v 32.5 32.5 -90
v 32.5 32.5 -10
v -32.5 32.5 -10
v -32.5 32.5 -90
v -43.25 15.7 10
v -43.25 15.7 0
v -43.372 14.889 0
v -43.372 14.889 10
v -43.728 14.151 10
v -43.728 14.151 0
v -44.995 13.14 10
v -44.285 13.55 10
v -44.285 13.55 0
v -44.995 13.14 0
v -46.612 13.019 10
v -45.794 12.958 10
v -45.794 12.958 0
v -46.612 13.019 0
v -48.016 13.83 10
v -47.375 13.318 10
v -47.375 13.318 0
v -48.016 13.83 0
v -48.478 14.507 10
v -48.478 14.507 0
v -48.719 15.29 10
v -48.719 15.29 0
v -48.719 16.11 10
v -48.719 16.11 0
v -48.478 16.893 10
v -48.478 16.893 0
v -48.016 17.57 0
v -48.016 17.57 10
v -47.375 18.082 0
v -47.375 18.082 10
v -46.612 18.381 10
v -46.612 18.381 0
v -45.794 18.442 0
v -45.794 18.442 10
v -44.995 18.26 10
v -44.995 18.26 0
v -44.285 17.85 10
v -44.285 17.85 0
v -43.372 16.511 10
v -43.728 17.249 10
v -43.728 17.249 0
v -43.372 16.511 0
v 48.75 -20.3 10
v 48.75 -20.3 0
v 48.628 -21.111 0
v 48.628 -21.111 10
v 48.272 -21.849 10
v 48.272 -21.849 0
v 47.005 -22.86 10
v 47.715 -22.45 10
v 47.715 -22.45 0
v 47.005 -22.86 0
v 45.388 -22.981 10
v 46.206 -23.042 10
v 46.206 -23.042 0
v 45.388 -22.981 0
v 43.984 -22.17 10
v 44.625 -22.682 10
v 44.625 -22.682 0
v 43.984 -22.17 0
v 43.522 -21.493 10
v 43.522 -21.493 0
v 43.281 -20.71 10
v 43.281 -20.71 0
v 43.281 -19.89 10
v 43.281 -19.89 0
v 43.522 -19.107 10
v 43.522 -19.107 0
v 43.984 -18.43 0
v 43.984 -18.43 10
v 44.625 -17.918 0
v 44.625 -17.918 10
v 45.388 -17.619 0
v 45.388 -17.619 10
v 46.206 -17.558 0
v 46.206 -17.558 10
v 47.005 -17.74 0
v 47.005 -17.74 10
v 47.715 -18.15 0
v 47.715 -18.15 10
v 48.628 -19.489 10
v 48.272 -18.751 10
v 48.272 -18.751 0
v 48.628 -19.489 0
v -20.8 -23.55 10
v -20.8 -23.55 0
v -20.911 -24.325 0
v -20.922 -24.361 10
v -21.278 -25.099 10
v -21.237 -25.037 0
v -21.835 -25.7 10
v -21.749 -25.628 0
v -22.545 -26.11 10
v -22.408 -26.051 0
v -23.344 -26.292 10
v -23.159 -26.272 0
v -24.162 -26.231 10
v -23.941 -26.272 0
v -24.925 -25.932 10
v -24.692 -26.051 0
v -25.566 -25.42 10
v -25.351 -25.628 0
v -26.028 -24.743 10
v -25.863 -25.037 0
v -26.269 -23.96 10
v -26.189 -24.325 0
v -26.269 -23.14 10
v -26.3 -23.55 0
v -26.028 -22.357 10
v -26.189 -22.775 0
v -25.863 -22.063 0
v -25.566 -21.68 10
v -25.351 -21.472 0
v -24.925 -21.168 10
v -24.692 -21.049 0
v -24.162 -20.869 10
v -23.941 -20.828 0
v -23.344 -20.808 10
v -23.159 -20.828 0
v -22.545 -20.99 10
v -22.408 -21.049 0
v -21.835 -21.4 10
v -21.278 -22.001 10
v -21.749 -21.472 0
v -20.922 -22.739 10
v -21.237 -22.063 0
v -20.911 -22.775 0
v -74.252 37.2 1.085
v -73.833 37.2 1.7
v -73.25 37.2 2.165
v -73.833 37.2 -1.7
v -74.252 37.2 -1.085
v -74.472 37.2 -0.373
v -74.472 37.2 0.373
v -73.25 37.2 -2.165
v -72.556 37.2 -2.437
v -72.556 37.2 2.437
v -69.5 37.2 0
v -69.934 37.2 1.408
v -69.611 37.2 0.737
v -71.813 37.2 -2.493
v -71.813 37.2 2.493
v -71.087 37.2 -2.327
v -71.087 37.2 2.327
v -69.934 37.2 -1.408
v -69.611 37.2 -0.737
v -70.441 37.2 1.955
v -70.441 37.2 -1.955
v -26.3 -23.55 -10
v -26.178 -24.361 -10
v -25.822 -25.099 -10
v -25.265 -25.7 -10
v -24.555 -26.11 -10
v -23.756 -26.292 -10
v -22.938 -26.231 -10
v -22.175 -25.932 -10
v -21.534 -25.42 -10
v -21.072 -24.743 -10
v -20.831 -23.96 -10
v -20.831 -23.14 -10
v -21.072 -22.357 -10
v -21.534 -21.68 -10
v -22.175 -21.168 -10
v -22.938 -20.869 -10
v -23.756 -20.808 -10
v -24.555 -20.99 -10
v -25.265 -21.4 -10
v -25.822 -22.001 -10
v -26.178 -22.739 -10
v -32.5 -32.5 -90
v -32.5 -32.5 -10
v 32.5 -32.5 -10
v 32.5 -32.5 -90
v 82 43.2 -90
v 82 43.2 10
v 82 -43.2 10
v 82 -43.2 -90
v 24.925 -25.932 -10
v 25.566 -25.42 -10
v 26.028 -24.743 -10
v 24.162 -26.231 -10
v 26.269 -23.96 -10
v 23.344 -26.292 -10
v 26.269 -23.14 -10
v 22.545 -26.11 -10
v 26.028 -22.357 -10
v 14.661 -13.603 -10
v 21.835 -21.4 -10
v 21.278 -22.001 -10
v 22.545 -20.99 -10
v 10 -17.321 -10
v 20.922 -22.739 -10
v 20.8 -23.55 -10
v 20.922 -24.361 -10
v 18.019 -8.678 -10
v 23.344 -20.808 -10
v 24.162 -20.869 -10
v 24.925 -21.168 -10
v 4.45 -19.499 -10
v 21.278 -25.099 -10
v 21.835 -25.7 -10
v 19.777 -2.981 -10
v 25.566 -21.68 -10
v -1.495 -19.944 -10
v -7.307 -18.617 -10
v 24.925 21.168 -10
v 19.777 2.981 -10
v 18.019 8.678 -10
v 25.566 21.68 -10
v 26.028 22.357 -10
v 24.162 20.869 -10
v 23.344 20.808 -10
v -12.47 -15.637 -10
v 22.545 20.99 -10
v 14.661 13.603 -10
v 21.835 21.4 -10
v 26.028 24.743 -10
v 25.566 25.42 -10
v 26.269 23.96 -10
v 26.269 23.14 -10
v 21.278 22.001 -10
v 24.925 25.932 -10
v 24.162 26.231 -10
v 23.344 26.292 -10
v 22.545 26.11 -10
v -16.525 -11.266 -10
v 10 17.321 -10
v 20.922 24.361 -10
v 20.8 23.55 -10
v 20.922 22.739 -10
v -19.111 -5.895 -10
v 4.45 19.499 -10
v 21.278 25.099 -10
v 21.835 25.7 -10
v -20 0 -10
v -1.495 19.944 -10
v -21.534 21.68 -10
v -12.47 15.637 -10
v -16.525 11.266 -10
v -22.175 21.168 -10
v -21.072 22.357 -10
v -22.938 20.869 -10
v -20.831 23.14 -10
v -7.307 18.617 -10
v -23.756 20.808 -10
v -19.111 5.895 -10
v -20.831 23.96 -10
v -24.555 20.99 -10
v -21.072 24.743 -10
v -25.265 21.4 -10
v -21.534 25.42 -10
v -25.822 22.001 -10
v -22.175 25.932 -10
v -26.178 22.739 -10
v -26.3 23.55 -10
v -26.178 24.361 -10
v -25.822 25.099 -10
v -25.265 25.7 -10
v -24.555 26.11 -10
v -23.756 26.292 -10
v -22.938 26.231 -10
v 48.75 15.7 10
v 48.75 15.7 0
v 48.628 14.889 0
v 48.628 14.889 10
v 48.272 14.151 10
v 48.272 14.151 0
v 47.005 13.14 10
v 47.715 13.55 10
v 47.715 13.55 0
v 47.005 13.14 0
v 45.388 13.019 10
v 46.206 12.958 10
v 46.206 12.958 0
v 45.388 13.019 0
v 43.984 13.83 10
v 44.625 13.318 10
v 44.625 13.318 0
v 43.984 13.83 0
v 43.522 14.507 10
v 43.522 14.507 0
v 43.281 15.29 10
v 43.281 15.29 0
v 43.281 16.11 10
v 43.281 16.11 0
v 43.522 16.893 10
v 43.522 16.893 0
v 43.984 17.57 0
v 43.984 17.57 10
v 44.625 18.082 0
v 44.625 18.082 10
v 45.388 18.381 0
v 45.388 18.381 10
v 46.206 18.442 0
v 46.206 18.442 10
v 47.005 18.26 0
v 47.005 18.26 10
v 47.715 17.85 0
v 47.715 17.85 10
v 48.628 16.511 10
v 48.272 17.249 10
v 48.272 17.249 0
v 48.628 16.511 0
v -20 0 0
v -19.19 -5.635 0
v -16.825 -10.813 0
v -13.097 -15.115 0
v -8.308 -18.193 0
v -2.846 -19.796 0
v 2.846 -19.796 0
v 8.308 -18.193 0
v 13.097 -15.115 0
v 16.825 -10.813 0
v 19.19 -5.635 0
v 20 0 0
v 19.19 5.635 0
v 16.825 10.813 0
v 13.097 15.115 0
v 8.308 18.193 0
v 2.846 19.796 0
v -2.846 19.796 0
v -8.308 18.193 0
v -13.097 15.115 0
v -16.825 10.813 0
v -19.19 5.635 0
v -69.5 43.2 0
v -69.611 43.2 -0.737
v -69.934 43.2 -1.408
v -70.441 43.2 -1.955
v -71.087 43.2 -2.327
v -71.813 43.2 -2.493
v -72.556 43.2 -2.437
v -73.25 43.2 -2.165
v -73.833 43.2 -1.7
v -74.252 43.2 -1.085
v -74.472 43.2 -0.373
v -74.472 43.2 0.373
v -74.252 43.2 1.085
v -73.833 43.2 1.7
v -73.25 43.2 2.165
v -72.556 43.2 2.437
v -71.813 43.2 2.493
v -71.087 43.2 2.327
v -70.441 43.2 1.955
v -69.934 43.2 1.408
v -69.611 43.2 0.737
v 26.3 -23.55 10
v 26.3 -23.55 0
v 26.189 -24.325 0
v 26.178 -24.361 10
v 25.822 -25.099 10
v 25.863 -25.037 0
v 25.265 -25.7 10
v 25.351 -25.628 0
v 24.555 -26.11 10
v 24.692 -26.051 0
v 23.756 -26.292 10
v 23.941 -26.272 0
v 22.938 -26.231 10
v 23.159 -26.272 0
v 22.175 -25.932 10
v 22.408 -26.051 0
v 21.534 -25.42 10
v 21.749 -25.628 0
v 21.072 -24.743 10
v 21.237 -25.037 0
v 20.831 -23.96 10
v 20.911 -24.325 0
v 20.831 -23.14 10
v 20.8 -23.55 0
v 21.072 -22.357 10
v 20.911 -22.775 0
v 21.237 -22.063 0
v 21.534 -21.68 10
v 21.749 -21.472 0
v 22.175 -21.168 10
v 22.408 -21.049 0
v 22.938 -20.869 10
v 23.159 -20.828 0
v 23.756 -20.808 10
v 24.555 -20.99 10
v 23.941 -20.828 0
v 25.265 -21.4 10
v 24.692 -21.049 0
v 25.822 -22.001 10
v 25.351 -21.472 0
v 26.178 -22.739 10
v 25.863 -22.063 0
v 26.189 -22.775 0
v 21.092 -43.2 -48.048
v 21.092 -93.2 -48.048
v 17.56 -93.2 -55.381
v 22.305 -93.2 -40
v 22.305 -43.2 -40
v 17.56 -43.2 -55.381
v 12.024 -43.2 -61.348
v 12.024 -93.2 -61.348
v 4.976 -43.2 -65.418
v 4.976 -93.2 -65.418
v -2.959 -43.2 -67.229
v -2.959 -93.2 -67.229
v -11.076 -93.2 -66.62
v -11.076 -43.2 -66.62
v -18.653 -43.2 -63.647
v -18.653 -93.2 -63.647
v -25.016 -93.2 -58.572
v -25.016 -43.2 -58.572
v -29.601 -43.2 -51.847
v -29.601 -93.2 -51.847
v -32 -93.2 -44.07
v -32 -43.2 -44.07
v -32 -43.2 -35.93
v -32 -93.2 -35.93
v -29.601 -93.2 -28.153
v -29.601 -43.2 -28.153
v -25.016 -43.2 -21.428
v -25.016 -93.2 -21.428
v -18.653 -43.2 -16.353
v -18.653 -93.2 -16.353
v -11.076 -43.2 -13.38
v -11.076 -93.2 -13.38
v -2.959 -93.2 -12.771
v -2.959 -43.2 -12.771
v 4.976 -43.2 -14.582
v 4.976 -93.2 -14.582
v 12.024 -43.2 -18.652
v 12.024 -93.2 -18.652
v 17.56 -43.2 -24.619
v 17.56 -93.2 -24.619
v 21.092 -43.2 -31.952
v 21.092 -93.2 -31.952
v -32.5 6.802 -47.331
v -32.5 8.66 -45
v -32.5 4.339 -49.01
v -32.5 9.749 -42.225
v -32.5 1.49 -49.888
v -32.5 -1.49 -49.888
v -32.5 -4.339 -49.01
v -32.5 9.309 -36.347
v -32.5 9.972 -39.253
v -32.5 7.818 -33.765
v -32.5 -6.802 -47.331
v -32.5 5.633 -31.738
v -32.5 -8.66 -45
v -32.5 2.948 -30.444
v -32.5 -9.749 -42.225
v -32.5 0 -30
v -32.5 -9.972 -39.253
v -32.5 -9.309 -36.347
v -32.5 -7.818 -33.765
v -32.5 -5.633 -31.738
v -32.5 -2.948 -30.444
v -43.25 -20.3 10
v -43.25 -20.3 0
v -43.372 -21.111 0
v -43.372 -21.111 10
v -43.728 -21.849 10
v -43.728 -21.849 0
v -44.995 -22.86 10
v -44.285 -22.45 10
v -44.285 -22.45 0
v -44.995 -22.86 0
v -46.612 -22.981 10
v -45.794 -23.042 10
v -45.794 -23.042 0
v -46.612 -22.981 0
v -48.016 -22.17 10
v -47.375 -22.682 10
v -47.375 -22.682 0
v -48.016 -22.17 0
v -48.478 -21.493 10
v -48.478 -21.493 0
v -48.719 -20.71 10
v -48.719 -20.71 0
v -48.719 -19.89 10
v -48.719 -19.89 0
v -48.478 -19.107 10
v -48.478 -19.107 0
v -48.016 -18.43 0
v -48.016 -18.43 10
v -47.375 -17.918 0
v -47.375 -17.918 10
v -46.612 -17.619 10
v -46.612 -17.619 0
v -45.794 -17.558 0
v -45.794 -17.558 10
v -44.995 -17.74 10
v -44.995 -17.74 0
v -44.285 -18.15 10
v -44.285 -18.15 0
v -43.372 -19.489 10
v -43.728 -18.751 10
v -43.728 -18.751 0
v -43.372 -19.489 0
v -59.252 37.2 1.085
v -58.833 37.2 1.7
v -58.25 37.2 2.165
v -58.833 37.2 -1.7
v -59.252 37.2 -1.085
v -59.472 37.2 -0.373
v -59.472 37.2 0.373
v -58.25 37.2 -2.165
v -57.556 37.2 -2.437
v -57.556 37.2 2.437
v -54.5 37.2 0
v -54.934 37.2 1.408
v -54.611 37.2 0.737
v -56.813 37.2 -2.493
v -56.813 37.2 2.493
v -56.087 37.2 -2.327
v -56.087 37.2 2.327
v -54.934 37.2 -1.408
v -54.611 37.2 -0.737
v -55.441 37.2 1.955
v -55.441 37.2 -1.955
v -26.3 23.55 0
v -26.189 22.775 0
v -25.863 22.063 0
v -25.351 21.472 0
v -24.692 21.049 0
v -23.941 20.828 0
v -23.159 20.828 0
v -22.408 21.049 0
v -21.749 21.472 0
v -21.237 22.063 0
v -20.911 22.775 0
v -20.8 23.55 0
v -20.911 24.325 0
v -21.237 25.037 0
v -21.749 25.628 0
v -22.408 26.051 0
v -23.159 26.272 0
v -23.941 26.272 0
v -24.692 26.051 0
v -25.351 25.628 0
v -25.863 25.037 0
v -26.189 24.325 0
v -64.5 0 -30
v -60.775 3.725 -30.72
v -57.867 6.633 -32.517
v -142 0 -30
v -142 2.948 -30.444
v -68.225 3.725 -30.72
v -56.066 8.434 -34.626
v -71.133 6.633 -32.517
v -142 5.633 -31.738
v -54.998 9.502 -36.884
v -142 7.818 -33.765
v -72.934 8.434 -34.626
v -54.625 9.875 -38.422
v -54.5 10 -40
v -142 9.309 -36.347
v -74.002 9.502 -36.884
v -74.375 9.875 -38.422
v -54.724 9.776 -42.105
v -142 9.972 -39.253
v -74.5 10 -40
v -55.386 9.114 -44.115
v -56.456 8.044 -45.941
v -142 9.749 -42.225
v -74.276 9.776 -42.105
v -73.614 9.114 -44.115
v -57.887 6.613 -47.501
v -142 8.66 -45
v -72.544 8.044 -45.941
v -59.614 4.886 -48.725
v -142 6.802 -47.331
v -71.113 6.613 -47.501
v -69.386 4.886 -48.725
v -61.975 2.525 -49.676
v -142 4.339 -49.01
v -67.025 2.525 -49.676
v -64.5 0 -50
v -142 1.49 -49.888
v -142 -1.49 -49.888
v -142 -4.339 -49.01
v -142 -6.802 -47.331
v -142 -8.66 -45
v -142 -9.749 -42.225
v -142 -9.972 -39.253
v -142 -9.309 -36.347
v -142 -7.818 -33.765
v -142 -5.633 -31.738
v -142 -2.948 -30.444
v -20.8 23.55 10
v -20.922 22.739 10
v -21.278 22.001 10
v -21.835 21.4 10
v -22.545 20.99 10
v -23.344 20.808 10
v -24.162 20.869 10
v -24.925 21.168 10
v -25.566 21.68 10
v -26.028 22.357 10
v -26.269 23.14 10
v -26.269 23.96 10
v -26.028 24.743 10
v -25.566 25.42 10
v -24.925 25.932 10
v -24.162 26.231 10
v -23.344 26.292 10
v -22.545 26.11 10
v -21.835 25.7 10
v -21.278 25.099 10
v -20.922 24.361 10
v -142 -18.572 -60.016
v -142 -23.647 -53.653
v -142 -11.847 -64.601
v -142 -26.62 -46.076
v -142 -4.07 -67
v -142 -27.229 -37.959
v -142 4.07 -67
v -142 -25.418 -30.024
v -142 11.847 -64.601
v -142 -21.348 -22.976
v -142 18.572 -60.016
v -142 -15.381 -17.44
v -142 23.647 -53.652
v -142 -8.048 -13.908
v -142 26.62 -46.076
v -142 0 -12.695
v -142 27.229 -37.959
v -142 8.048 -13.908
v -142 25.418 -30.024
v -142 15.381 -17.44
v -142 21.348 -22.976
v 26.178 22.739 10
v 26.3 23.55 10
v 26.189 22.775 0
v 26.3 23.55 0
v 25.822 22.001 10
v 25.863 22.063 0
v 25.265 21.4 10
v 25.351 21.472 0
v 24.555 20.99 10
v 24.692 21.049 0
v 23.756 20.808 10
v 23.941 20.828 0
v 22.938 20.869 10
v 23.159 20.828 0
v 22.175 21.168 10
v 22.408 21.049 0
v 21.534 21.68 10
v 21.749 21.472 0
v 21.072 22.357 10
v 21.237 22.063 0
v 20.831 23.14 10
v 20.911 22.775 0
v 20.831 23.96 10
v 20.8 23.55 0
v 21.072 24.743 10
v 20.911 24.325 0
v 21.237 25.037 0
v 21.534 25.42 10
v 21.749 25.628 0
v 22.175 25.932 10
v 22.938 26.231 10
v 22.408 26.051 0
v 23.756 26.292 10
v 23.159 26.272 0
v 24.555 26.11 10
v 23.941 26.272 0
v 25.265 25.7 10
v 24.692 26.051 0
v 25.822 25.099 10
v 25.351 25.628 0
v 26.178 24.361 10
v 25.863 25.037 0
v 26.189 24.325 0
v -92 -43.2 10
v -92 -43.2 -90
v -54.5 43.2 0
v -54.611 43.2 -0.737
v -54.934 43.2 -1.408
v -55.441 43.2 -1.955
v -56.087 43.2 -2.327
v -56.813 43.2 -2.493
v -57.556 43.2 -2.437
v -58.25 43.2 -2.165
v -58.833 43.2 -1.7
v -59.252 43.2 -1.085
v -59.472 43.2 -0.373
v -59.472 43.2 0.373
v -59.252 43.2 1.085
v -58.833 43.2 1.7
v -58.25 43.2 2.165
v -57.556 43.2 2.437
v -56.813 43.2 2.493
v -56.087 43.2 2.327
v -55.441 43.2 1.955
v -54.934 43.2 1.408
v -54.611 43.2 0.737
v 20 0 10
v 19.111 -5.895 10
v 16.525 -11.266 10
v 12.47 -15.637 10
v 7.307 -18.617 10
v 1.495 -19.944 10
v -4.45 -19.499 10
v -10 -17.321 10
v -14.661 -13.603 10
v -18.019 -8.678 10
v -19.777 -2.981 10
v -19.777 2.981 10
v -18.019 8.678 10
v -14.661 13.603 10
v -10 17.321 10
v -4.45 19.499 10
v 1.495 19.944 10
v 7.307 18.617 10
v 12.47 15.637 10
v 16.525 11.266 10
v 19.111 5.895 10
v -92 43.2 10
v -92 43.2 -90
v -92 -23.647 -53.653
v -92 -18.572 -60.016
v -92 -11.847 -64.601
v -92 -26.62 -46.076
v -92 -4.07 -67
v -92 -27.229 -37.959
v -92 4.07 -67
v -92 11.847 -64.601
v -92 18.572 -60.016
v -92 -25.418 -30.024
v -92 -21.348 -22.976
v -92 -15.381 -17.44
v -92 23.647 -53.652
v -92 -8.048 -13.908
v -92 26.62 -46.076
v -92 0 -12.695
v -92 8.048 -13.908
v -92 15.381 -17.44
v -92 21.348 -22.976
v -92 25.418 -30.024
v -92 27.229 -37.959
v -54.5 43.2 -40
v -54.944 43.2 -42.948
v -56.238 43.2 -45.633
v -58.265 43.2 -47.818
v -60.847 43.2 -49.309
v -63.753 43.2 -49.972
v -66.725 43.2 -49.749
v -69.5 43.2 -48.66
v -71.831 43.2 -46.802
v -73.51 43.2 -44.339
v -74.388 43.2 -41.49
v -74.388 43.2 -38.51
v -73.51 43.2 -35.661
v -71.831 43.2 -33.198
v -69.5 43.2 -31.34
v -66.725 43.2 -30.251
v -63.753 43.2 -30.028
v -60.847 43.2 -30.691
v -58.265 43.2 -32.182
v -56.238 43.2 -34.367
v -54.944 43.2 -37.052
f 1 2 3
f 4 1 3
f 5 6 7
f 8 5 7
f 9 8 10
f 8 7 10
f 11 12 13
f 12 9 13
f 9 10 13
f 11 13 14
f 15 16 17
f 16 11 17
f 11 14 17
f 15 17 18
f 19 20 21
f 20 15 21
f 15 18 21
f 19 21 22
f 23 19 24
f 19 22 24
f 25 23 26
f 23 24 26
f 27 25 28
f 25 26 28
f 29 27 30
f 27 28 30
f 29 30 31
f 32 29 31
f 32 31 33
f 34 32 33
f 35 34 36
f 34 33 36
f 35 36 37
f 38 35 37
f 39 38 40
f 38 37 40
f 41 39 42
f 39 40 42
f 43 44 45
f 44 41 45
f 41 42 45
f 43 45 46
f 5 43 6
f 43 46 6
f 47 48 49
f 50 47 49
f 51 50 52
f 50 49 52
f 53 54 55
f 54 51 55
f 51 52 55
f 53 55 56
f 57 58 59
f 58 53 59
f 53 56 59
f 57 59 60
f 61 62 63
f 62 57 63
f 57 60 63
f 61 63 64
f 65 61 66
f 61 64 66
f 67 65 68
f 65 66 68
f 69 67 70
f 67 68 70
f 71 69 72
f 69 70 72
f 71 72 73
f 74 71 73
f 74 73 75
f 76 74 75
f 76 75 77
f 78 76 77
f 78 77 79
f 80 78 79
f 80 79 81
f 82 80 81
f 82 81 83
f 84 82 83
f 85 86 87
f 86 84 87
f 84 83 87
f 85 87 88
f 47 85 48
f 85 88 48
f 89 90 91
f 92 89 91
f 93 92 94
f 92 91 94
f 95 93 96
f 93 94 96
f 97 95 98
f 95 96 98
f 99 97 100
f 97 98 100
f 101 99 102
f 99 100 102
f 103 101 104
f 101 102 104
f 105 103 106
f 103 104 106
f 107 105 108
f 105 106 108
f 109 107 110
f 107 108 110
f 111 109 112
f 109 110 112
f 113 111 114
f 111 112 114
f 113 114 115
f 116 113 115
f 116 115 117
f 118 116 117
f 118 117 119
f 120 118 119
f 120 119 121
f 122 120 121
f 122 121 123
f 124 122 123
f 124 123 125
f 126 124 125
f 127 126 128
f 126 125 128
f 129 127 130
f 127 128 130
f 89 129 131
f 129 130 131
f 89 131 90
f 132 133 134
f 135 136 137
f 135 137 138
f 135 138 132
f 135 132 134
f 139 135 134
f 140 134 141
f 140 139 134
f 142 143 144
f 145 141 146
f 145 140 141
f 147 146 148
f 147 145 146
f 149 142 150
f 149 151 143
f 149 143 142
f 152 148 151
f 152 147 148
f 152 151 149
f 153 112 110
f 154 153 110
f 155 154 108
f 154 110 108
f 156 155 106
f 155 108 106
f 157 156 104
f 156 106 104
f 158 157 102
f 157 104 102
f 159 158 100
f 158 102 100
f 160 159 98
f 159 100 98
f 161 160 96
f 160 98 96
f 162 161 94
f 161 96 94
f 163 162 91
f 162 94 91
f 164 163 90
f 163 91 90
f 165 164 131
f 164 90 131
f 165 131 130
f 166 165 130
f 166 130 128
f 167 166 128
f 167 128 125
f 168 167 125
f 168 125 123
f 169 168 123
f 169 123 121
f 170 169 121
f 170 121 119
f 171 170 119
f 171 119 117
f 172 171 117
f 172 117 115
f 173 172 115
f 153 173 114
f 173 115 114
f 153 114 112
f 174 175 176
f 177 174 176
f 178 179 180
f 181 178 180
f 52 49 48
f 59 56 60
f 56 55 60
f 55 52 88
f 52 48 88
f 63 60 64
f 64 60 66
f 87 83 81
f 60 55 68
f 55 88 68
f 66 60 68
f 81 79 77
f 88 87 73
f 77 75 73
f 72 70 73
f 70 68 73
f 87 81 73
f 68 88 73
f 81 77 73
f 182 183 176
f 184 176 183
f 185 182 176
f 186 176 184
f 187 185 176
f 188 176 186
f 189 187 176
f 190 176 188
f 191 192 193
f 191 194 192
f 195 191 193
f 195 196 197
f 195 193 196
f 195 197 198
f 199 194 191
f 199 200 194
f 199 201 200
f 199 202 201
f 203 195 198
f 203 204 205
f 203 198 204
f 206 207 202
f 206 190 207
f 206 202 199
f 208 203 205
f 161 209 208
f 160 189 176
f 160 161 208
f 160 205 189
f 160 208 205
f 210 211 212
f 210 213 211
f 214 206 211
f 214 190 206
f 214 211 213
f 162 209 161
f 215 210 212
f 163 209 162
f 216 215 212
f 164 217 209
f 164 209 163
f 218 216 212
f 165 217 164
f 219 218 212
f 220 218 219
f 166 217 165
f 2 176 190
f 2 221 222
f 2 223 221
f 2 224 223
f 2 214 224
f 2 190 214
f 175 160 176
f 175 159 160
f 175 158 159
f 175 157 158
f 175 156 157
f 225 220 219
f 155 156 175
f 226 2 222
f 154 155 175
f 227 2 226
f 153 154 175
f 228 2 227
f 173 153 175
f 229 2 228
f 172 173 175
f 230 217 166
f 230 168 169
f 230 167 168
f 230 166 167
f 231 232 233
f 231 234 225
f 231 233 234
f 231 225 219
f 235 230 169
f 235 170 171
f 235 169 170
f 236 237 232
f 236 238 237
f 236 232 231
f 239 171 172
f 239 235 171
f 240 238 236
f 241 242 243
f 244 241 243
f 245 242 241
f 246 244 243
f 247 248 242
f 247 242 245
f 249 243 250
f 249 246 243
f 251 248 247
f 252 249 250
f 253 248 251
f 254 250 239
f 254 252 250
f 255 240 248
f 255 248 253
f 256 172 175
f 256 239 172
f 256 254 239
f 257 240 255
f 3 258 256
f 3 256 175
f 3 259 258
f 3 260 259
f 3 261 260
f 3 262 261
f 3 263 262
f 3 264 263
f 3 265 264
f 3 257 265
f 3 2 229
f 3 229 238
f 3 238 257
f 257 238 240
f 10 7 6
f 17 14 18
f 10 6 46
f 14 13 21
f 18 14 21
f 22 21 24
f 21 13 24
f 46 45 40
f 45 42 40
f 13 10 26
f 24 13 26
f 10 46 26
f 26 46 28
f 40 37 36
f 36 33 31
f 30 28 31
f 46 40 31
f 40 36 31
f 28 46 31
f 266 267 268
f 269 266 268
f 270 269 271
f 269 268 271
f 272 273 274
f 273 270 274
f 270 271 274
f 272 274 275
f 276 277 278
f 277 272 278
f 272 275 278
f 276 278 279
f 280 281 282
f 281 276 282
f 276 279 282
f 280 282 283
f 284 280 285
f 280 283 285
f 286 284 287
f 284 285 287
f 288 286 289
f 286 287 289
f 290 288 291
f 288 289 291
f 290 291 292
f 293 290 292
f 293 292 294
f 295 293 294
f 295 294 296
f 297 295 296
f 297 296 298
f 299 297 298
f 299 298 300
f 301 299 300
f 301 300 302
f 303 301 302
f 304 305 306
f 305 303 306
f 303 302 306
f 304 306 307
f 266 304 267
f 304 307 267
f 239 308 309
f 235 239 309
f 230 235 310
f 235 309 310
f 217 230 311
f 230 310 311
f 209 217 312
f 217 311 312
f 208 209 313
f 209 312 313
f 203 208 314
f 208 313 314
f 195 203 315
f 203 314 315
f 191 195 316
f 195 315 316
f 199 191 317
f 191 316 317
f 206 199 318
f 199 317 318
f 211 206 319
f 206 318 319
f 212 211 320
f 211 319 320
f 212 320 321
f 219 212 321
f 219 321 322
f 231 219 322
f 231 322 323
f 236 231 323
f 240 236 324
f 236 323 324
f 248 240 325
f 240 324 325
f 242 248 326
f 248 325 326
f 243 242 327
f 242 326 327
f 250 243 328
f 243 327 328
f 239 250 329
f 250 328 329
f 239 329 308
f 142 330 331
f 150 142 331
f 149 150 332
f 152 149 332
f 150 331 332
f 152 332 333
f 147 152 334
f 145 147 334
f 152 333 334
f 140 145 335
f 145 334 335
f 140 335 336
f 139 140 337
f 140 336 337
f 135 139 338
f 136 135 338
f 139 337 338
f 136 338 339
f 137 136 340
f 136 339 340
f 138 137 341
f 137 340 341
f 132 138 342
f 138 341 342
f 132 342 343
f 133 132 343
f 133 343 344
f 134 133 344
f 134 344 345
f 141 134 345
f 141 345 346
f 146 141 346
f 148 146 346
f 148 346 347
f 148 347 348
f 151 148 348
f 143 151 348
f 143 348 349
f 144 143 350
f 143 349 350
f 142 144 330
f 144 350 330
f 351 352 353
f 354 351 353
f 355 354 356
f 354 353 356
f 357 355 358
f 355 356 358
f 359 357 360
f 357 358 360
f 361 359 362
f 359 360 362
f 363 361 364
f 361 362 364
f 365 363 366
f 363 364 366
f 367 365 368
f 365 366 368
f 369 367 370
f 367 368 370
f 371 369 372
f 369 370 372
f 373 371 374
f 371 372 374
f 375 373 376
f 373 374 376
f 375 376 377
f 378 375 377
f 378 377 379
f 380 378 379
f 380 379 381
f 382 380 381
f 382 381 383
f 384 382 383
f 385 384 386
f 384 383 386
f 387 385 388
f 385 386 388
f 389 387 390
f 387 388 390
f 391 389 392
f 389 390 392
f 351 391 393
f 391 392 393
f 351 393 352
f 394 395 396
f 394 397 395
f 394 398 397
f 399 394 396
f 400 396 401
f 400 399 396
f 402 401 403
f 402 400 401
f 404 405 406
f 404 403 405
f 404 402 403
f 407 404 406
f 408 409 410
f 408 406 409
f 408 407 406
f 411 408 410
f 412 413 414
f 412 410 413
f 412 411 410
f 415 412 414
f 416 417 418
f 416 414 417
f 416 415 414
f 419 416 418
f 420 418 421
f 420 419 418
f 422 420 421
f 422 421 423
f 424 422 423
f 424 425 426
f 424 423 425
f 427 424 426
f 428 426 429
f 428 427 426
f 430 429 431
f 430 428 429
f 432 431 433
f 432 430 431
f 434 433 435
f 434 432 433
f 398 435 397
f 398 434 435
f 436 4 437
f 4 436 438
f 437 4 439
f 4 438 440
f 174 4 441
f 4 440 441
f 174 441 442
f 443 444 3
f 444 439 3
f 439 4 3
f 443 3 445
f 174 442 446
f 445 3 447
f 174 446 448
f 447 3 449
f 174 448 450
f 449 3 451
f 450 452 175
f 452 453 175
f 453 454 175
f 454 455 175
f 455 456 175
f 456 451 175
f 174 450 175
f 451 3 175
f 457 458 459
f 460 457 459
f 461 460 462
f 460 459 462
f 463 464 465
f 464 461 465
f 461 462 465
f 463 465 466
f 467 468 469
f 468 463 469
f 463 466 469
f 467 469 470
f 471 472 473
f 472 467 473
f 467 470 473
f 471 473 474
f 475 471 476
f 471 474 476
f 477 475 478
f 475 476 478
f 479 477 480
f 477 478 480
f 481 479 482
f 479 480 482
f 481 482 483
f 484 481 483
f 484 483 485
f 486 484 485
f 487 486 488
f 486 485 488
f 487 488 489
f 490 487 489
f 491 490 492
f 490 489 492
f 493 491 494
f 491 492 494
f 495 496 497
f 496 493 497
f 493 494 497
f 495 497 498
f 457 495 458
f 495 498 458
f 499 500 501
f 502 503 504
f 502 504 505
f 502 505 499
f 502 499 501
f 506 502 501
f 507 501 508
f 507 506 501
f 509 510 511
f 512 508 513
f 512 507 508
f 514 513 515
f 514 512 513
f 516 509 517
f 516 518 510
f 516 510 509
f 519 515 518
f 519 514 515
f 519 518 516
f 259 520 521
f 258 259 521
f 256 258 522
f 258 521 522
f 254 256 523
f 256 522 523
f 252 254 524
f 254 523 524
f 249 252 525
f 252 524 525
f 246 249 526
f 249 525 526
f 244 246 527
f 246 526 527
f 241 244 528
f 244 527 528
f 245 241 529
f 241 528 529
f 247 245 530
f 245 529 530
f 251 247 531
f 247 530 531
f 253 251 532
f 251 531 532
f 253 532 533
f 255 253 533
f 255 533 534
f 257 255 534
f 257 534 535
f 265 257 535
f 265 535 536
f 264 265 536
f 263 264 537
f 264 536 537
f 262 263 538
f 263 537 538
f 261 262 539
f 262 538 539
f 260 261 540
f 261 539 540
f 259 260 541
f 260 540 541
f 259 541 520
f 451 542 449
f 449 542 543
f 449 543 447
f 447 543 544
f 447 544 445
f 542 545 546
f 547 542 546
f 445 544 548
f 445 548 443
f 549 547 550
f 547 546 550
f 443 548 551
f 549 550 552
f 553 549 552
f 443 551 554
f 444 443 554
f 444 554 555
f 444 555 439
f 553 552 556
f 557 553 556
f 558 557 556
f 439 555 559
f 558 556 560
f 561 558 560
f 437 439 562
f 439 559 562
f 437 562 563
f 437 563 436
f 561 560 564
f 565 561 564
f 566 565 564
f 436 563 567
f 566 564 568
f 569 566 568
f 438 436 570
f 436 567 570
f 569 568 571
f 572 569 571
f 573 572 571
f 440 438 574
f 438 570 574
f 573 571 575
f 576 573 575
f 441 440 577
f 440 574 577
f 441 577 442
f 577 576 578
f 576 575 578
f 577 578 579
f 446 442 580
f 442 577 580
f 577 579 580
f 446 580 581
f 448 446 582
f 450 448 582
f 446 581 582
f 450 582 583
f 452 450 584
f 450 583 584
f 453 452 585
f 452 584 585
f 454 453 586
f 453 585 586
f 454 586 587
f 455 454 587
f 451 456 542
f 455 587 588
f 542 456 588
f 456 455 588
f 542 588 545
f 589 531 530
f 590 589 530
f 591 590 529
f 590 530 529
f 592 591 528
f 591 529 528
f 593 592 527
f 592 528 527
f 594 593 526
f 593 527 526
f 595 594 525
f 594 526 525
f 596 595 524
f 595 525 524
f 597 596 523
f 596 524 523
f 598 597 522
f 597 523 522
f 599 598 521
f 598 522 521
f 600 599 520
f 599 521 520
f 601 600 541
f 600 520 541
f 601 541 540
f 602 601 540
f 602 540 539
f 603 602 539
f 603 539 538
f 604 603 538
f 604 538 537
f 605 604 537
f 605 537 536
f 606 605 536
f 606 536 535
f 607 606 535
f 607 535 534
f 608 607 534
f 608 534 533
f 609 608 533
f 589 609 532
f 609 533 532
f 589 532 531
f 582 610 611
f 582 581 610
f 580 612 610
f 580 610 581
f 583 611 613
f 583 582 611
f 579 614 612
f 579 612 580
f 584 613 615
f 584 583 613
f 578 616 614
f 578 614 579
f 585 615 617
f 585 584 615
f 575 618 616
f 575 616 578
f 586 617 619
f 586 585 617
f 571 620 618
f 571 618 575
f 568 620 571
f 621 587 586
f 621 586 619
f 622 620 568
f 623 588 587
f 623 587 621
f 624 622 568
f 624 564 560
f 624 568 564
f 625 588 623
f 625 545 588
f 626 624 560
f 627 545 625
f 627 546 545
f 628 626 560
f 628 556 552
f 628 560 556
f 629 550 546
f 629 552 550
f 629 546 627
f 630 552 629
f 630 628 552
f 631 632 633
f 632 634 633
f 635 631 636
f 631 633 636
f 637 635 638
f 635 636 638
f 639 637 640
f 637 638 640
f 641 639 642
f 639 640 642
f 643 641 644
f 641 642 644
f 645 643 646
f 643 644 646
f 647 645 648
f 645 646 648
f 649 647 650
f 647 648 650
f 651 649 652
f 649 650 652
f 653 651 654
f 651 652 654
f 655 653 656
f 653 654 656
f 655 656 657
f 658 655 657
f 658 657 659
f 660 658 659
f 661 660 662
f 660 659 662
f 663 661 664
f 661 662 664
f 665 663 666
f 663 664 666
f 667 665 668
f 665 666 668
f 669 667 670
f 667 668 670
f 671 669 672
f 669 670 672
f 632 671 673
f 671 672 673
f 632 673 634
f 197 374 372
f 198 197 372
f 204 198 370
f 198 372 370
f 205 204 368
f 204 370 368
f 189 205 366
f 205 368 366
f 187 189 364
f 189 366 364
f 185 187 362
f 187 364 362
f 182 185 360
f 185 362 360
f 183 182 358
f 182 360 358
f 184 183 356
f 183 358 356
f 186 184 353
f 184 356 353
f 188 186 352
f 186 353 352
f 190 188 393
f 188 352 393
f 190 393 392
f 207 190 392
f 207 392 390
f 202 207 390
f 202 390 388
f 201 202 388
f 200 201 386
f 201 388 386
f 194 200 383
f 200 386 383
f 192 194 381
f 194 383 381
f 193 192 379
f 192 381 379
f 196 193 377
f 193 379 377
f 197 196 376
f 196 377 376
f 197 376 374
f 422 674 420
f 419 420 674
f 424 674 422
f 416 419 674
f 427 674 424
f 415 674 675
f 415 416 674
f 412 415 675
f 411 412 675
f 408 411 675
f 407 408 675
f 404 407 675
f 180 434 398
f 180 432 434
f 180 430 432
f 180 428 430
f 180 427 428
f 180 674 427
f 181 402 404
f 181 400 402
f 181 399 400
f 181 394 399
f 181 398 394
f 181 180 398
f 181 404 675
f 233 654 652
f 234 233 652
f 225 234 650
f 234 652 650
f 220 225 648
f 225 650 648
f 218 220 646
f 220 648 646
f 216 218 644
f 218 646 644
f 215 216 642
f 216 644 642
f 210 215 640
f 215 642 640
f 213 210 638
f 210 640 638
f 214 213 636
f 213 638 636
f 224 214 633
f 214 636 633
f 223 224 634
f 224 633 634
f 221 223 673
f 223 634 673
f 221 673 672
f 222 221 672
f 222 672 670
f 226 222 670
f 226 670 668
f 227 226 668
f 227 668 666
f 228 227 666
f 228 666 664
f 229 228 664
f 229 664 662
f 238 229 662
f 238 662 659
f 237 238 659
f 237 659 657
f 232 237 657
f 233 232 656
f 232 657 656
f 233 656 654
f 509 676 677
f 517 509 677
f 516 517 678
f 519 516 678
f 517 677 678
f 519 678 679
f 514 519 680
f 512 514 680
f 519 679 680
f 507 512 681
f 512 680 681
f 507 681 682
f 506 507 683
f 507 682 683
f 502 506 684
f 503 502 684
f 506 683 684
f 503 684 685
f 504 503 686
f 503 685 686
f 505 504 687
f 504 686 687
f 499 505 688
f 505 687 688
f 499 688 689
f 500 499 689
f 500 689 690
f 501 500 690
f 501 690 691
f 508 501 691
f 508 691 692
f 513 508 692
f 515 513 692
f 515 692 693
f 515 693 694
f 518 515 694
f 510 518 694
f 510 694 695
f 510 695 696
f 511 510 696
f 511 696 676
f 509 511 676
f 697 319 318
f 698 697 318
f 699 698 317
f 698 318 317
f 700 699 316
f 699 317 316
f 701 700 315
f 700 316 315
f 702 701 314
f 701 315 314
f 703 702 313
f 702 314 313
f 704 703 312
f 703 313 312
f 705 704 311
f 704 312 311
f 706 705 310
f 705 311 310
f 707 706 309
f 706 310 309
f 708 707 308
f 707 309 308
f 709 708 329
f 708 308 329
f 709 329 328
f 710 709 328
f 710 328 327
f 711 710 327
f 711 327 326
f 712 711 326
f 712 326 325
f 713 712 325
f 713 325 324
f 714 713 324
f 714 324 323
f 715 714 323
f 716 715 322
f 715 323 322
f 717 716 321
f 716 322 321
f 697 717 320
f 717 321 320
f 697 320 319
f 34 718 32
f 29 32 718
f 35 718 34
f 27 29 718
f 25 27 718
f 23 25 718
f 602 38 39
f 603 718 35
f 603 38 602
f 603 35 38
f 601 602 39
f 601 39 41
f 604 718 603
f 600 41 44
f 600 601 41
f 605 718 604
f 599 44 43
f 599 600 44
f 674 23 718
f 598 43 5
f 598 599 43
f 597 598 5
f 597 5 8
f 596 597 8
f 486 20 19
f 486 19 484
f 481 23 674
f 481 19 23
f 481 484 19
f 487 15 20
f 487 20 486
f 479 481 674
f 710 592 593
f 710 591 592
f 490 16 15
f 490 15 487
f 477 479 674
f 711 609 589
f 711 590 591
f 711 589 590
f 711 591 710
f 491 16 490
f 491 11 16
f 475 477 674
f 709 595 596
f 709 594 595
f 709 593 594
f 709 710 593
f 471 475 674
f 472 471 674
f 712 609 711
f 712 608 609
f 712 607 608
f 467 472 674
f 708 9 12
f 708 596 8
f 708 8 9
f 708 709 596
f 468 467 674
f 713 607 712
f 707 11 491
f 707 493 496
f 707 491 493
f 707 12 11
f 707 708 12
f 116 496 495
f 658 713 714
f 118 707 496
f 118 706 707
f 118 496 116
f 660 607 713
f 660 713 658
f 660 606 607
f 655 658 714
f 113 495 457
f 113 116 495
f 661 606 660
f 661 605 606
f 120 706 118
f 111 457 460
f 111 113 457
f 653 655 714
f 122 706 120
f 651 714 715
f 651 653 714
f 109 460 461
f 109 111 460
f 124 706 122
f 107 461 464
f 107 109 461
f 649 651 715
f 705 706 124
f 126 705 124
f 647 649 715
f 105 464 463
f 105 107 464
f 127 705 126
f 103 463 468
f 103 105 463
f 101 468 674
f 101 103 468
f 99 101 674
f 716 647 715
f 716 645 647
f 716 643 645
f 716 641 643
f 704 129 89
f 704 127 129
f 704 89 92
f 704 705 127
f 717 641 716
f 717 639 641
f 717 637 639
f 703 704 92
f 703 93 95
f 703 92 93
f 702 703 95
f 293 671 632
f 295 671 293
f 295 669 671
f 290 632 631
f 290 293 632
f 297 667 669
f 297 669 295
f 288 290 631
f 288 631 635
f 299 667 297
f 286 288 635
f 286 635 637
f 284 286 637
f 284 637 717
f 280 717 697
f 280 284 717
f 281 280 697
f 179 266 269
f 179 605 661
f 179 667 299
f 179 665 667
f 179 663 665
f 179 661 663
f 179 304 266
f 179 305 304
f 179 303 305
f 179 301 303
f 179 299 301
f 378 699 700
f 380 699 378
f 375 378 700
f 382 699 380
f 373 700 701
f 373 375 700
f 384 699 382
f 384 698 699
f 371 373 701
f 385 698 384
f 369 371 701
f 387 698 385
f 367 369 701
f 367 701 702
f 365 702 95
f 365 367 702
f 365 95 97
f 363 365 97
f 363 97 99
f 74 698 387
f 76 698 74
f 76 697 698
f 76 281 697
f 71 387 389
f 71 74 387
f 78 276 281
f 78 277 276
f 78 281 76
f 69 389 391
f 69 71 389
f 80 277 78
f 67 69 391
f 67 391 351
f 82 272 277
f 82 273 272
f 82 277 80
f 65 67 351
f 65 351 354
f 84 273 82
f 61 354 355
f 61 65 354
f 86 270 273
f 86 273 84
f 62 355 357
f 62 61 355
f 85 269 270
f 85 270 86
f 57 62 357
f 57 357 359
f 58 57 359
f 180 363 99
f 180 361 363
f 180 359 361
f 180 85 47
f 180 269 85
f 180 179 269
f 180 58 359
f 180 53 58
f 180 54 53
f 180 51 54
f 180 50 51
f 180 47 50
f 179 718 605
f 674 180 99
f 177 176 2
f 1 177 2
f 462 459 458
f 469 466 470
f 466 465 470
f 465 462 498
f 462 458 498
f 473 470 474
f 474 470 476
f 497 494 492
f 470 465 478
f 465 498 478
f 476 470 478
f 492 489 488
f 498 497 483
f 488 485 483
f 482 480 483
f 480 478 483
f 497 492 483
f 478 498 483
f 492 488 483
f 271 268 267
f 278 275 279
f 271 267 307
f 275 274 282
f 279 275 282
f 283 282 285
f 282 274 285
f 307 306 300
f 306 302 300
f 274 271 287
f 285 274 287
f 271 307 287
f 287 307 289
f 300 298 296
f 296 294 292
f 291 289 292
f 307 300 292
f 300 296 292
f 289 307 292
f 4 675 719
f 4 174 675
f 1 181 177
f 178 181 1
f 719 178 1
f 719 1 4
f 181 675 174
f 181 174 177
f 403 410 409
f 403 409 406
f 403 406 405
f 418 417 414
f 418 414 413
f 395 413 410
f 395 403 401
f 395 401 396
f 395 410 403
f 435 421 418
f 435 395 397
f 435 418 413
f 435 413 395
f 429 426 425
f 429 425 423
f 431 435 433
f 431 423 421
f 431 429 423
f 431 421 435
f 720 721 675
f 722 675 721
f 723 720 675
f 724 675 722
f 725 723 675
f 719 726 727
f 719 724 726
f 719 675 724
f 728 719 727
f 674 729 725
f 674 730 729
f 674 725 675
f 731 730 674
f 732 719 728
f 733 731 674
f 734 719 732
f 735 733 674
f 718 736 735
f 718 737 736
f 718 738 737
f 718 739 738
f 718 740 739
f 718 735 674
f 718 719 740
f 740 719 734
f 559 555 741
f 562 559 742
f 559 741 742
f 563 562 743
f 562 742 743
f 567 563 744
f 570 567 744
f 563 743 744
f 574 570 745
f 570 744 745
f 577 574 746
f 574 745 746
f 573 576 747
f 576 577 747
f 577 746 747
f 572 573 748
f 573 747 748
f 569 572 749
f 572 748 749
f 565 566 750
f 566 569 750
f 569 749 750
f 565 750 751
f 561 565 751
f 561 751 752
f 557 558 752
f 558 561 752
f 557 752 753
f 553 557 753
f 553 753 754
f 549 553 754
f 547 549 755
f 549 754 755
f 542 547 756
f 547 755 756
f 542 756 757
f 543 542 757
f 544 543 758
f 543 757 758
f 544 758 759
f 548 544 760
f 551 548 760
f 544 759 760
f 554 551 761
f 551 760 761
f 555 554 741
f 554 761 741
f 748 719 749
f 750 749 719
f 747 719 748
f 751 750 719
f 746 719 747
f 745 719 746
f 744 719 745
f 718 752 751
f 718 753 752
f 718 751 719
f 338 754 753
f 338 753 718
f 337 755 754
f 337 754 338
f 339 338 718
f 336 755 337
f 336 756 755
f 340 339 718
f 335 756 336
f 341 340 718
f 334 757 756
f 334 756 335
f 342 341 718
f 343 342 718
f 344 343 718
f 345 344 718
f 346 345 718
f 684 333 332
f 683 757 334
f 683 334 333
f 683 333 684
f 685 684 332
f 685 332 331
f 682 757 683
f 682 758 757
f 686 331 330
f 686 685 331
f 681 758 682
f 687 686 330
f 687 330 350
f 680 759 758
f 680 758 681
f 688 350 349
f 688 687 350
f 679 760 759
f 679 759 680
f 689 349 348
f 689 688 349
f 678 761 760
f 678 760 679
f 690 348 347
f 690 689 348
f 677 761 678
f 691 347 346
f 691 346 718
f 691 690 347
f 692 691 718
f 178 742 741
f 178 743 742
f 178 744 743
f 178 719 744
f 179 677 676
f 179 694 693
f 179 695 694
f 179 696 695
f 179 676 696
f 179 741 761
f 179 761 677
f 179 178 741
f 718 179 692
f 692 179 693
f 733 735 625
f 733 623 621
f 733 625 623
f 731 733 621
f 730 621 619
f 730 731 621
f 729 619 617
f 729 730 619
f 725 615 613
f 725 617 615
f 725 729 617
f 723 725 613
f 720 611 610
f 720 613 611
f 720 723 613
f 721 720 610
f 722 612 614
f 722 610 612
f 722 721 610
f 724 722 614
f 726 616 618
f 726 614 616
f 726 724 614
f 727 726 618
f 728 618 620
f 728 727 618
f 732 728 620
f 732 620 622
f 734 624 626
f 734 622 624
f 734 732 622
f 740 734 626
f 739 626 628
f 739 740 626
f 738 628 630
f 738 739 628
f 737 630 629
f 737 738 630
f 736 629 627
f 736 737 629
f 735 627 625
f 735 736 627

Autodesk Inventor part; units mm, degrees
ref_plane "YZ Plane" through (0, 0, 0) normal (1, 0, 0) x (0, 1, 0)
ref_plane "XZ Plane" through (0, 0, 0) normal (0, 1, 0) x (-1, 0, 0)
ref_plane "XY Plane" through (0, 0, 0) normal (0, 0, 1) x (1, 0, 0)
sketch "Sketch1" plane through (0, 0, 0) normal (0, 0, 1) x (1, 0, 0)
  line L0 (-23.55, 23.55) -> (23.55, 23.55) construction
  line L1 (23.55, 23.55) -> (23.55, -23.55) construction
  line L2 (23.55, -23.55) -> (-23.55, -23.55) construction
  line L3 (-23.55, -23.55) -> (-23.55, 23.55) construction
  line L4 (0, 23.55) -> (0, -23.55) construction
  line L5 (-23.55, 0) -> (23.55, 0) construction
  circle A0 centre (-23.55, 23.55) radius 2.75
  circle A1 centre (23.55, 23.55) radius 2.75
  circle A2 centre (-23.55, -23.55) radius 2.75
  circle A3 centre (23.55, -23.55) radius 2.75
  circle A4 centre (0, 0) radius 20
  line L6 (-28.2, 28.2) -> (28.2, 28.2) construction
  line L7 (28.2, 28.2) -> (28.2, -28.2) construction
  line L8 (28.2, -28.2) -> (-28.2, -28.2) construction
  line L9 (-28.2, -28.2) -> (-28.2, 28.2) construction
  line L10 (-28.2, 0) -> (28.2, 0) construction
  line L11 (0, -28.2) -> (0, 28.2) construction
  line L12 (-60, 21.2) -> (-32, 21.2) construction
  line L13 (-32, 21.2) -> (-32, -25.8) construction
  line L14 (-32, -25.8) -> (-60, -25.8) construction
  line L15 (-60, -25.8) -> (-60, 21.2) construction
  line L16 (-46, 21.2) -> (-46, -25.8) construction
  line L17 (-60, -2.3) -> (-32, -2.3) construction
  circle A5 centre (-46, 15.7) radius 2.75
  circle A6 centre (-46, -20.3) radius 2.75
  line L18 (60, 21.2) -> (32, 21.2) construction
  line L19 (32, 21.2) -> (32, -25.8) construction
  line L20 (32, -25.8) -> (60, -25.8) construction
  line L21 (60, -25.8) -> (60, 21.2) construction
  line L22 (46, 21.2) -> (46, -25.8) construction
  line L23 (60, -2.3) -> (32, -2.3) construction
  circle A7 centre (46, 15.7) radius 2.75
  circle A8 centre (46, -20.3) radius 2.75
  line L24 (-82, 43.2) -> (82, 43.2)
  line L25 (82, 43.2) -> (82, -43.2)
  line L26 (82, -43.2) -> (-82, -43.2)
  line L27 (-82, -43.2) -> (-82, 43.2)
  point P0 (0, 0)
  dimension "d0" = 47.1
  dimension "d1" = 47.1
  dimension "d2" = 5.5
  dimension "d4" = 40
  dimension "d5" = 56.4
  dimension "d6" = 56.4
  dimension "d9" = 46
  dimension "d10" = 47
  dimension "d11" = 28
  dimension "d12" = 5.5
  dimension "d13" = 36
  dimension "d14" = 22
  dimension "d15" = 15
  dimension "d18" = 2.3
extrude "Extrusion1" add sketch "Sketch1" along normal blind 10
sketch "Sketch2" plane through (0, 0, 0) normal (0, 0, -1) x (-1, 0, 0)
  line L0 (32.5, -32.5) -> (-32.5, -32.5)
  line L1 (-32.5, -32.5) -> (-32.5, 32.5)
  line L2 (-32.5, 32.5) -> (32.5, 32.5)
  line L3 (32.5, 32.5) -> (32.5, -32.5)
  line L4 (0, 32.5) -> (0, -32.5) construction
  line L5 (-32.5, 0) -> (32.5, 0) construction
  line L6 (-82, -43.2) -> (-82, 43.2) projected
  line L7 (82, -43.2) -> (-82, -43.2) projected
  line L8 (-82, 43.2) -> (82, 43.2)
  line L9 (82, 43.2) -> (82, -43.2)
  line L10 (82, -43.2) -> (-82, -43.2)
  line L11 (-82, -43.2) -> (-82, 43.2)
  point P0 (0, 0)
  point P1 (0, 0)
  dimension "d19" = 65
  dimension "d20" = 65
extrude "Extrusion2" add sketch "Sketch2" along normal blind 90
sketch "Sketch3" plane through (0, 0, 0) normal (0, 0, -1) x (-1, 0, 0)
  line L0 (32.5, -32.5) -> (32.5, 32.5) projected
  line L1 (32.5, 32.5) -> (-32.5, 32.5) projected
  line L2 (-32.5, 32.5) -> (-32.5, -32.5) projected
  line L3 (-32.5, -32.5) -> (32.5, -32.5) projected
  circle A0 centre (23.55, 23.55) radius 2.75 projected
  circle A1 centre (-23.55, 23.55) radius 2.75 projected
  circle A2 centre (23.55, -23.55) radius 2.75 projected
  circle A3 centre (-23.55, -23.55) radius 2.75 projected
  circle A4 centre (0, 0) radius 20 projected
extrude "Extrusion3" add sketch "Sketch3" along normal blind 10
sketch "Sketch4" plane through (-82, -43.2, 10) normal (-1, 0, 0) x (0, 0, 1)
  line L0 (0, 0) -> (-100, 0) projected
  line L1 (0, 86.4) -> (0, 0) projected
  line L2 (-100, 86.4) -> (0, 86.4) projected
  line L3 (-100, 0) -> (-100, 86.4) projected
  point P0 (-10, 43.2)
extrude "Extrusion4" add sketch "Sketch4" along normal blind 10
sketch "Sketch5" plane through (82, -43.2, -90) normal (0, -1, 0) x (1, 0, 0)
  line L0 (-174, 0) -> (-174, 100) construction
  line L1 (-174, 50) -> (0, 50) construction
  line L2 (0, 0) -> (0, 100) construction
  line L3 (0, 100) -> (-174, 100) construction
  line L4 (-87, 100) -> (-87, 0) construction
  line L5 (0, 0) -> (-174, 0) construction
  circle A0 centre (-87, 50) radius 27.305
  point P0 (-82, 90)
  dimension "d27" = 54.61
extrude "Extrusion5" add sketch "Sketch5" along normal blind 50
sketch "Sketch6" plane through (-92, -43.2, 10) normal (-1, 0, 0) x (0, 0, 1)
  line L0 (-100, 75.7) -> (-100, 10.7) construction
  line L1 (-100, 43.2) -> (0, 43.2) construction
  line L2 (0, 0) -> (0, 86.4) construction
  line L3 (-100, 86.4) -> (0, 86.4) construction
  line L4 (-50, 86.4) -> (-50, 0) construction
  line L5 (-100, 0) -> (0, 0) construction
  circle A0 centre (-50, 43.2) radius 27.305
  point P0 (-10, 43.2)
  dimension "d30" = 54.61
extrude "Extrusion6" add sketch "Sketch6" along normal blind 50
sketch "Sketch7" plane through (-142, 0, -40) normal (-1, 0, 0) x (0, 0, 1)
  circle A0 centre (0, 0) radius 27.305 projected
  circle A1 centre (0, 0) radius 10
  point P0 (40, 0)
  dimension "d33" = 20
extrude "Extrusion7" cut sketch "Sketch7" against normal up to surface (109.5 mm away) contours A1
sketch "Sketch8" plane through (82, 43.2, 10) normal (0, 1, 0) x (1, 0, 0)
  line L0 (-174, 100) -> (-174, 0) construction
  line L1 (-174, 0) -> (-154, 0) construction
  line L2 (-154, 0) -> (-154, 10) construction
  line L3 (-154, 10) -> (-174, 10) construction
  line L4 (-174, 10) -> (-174, 0) construction
  line L5 (0, 0) -> (-174, 0) construction
  line L6 (-154, 10) -> (-139, 10) construction
  line L7 (-139, 10) -> (-139, 0) construction
  line L8 (-139, 0) -> (-154, 0) construction
  line L9 (-154, 0) -> (-154, 10) construction
  circle A0 centre (-139, 10) radius 2.5
  circle A1 centre (-154, 10) radius 2.5
  point P0 (-82, 10)
  dimension "d36" = 20
  dimension "d37" = 10
  dimension "d38" = 15
  dimension "d39" = 5
  dimension "d40" = 5
extrude "Extrusion8" cut sketch "Sketch8" against normal blind 6
sketch "Sketch9" plane through (82, 43.2, 10) normal (0, 1, 0) x (1, 0, 0)
  line L0 (-174, 0) -> (-174, 100) construction
  line L1 (-174, 50) -> (0, 50) construction
  line L2 (0, 100) -> (0, 0) construction
  circle A0 centre (-139, 10) radius 2.5 construction
  circle A1 centre (-154, 10) radius 2.5 construction
  line L3 (-139, 10) -> (-154, 10) construction
  line L4 (-146.5, 10) -> (-146.5, 50) construction
  circle A2 centre (-146.5, 50) radius 10
  point P0 (-82, 10)
  dimension "d43" = 20
extrude "Extrusion9" cut sketch "Sketch9" against normal blind 43.2
properties part number "driver_L"
